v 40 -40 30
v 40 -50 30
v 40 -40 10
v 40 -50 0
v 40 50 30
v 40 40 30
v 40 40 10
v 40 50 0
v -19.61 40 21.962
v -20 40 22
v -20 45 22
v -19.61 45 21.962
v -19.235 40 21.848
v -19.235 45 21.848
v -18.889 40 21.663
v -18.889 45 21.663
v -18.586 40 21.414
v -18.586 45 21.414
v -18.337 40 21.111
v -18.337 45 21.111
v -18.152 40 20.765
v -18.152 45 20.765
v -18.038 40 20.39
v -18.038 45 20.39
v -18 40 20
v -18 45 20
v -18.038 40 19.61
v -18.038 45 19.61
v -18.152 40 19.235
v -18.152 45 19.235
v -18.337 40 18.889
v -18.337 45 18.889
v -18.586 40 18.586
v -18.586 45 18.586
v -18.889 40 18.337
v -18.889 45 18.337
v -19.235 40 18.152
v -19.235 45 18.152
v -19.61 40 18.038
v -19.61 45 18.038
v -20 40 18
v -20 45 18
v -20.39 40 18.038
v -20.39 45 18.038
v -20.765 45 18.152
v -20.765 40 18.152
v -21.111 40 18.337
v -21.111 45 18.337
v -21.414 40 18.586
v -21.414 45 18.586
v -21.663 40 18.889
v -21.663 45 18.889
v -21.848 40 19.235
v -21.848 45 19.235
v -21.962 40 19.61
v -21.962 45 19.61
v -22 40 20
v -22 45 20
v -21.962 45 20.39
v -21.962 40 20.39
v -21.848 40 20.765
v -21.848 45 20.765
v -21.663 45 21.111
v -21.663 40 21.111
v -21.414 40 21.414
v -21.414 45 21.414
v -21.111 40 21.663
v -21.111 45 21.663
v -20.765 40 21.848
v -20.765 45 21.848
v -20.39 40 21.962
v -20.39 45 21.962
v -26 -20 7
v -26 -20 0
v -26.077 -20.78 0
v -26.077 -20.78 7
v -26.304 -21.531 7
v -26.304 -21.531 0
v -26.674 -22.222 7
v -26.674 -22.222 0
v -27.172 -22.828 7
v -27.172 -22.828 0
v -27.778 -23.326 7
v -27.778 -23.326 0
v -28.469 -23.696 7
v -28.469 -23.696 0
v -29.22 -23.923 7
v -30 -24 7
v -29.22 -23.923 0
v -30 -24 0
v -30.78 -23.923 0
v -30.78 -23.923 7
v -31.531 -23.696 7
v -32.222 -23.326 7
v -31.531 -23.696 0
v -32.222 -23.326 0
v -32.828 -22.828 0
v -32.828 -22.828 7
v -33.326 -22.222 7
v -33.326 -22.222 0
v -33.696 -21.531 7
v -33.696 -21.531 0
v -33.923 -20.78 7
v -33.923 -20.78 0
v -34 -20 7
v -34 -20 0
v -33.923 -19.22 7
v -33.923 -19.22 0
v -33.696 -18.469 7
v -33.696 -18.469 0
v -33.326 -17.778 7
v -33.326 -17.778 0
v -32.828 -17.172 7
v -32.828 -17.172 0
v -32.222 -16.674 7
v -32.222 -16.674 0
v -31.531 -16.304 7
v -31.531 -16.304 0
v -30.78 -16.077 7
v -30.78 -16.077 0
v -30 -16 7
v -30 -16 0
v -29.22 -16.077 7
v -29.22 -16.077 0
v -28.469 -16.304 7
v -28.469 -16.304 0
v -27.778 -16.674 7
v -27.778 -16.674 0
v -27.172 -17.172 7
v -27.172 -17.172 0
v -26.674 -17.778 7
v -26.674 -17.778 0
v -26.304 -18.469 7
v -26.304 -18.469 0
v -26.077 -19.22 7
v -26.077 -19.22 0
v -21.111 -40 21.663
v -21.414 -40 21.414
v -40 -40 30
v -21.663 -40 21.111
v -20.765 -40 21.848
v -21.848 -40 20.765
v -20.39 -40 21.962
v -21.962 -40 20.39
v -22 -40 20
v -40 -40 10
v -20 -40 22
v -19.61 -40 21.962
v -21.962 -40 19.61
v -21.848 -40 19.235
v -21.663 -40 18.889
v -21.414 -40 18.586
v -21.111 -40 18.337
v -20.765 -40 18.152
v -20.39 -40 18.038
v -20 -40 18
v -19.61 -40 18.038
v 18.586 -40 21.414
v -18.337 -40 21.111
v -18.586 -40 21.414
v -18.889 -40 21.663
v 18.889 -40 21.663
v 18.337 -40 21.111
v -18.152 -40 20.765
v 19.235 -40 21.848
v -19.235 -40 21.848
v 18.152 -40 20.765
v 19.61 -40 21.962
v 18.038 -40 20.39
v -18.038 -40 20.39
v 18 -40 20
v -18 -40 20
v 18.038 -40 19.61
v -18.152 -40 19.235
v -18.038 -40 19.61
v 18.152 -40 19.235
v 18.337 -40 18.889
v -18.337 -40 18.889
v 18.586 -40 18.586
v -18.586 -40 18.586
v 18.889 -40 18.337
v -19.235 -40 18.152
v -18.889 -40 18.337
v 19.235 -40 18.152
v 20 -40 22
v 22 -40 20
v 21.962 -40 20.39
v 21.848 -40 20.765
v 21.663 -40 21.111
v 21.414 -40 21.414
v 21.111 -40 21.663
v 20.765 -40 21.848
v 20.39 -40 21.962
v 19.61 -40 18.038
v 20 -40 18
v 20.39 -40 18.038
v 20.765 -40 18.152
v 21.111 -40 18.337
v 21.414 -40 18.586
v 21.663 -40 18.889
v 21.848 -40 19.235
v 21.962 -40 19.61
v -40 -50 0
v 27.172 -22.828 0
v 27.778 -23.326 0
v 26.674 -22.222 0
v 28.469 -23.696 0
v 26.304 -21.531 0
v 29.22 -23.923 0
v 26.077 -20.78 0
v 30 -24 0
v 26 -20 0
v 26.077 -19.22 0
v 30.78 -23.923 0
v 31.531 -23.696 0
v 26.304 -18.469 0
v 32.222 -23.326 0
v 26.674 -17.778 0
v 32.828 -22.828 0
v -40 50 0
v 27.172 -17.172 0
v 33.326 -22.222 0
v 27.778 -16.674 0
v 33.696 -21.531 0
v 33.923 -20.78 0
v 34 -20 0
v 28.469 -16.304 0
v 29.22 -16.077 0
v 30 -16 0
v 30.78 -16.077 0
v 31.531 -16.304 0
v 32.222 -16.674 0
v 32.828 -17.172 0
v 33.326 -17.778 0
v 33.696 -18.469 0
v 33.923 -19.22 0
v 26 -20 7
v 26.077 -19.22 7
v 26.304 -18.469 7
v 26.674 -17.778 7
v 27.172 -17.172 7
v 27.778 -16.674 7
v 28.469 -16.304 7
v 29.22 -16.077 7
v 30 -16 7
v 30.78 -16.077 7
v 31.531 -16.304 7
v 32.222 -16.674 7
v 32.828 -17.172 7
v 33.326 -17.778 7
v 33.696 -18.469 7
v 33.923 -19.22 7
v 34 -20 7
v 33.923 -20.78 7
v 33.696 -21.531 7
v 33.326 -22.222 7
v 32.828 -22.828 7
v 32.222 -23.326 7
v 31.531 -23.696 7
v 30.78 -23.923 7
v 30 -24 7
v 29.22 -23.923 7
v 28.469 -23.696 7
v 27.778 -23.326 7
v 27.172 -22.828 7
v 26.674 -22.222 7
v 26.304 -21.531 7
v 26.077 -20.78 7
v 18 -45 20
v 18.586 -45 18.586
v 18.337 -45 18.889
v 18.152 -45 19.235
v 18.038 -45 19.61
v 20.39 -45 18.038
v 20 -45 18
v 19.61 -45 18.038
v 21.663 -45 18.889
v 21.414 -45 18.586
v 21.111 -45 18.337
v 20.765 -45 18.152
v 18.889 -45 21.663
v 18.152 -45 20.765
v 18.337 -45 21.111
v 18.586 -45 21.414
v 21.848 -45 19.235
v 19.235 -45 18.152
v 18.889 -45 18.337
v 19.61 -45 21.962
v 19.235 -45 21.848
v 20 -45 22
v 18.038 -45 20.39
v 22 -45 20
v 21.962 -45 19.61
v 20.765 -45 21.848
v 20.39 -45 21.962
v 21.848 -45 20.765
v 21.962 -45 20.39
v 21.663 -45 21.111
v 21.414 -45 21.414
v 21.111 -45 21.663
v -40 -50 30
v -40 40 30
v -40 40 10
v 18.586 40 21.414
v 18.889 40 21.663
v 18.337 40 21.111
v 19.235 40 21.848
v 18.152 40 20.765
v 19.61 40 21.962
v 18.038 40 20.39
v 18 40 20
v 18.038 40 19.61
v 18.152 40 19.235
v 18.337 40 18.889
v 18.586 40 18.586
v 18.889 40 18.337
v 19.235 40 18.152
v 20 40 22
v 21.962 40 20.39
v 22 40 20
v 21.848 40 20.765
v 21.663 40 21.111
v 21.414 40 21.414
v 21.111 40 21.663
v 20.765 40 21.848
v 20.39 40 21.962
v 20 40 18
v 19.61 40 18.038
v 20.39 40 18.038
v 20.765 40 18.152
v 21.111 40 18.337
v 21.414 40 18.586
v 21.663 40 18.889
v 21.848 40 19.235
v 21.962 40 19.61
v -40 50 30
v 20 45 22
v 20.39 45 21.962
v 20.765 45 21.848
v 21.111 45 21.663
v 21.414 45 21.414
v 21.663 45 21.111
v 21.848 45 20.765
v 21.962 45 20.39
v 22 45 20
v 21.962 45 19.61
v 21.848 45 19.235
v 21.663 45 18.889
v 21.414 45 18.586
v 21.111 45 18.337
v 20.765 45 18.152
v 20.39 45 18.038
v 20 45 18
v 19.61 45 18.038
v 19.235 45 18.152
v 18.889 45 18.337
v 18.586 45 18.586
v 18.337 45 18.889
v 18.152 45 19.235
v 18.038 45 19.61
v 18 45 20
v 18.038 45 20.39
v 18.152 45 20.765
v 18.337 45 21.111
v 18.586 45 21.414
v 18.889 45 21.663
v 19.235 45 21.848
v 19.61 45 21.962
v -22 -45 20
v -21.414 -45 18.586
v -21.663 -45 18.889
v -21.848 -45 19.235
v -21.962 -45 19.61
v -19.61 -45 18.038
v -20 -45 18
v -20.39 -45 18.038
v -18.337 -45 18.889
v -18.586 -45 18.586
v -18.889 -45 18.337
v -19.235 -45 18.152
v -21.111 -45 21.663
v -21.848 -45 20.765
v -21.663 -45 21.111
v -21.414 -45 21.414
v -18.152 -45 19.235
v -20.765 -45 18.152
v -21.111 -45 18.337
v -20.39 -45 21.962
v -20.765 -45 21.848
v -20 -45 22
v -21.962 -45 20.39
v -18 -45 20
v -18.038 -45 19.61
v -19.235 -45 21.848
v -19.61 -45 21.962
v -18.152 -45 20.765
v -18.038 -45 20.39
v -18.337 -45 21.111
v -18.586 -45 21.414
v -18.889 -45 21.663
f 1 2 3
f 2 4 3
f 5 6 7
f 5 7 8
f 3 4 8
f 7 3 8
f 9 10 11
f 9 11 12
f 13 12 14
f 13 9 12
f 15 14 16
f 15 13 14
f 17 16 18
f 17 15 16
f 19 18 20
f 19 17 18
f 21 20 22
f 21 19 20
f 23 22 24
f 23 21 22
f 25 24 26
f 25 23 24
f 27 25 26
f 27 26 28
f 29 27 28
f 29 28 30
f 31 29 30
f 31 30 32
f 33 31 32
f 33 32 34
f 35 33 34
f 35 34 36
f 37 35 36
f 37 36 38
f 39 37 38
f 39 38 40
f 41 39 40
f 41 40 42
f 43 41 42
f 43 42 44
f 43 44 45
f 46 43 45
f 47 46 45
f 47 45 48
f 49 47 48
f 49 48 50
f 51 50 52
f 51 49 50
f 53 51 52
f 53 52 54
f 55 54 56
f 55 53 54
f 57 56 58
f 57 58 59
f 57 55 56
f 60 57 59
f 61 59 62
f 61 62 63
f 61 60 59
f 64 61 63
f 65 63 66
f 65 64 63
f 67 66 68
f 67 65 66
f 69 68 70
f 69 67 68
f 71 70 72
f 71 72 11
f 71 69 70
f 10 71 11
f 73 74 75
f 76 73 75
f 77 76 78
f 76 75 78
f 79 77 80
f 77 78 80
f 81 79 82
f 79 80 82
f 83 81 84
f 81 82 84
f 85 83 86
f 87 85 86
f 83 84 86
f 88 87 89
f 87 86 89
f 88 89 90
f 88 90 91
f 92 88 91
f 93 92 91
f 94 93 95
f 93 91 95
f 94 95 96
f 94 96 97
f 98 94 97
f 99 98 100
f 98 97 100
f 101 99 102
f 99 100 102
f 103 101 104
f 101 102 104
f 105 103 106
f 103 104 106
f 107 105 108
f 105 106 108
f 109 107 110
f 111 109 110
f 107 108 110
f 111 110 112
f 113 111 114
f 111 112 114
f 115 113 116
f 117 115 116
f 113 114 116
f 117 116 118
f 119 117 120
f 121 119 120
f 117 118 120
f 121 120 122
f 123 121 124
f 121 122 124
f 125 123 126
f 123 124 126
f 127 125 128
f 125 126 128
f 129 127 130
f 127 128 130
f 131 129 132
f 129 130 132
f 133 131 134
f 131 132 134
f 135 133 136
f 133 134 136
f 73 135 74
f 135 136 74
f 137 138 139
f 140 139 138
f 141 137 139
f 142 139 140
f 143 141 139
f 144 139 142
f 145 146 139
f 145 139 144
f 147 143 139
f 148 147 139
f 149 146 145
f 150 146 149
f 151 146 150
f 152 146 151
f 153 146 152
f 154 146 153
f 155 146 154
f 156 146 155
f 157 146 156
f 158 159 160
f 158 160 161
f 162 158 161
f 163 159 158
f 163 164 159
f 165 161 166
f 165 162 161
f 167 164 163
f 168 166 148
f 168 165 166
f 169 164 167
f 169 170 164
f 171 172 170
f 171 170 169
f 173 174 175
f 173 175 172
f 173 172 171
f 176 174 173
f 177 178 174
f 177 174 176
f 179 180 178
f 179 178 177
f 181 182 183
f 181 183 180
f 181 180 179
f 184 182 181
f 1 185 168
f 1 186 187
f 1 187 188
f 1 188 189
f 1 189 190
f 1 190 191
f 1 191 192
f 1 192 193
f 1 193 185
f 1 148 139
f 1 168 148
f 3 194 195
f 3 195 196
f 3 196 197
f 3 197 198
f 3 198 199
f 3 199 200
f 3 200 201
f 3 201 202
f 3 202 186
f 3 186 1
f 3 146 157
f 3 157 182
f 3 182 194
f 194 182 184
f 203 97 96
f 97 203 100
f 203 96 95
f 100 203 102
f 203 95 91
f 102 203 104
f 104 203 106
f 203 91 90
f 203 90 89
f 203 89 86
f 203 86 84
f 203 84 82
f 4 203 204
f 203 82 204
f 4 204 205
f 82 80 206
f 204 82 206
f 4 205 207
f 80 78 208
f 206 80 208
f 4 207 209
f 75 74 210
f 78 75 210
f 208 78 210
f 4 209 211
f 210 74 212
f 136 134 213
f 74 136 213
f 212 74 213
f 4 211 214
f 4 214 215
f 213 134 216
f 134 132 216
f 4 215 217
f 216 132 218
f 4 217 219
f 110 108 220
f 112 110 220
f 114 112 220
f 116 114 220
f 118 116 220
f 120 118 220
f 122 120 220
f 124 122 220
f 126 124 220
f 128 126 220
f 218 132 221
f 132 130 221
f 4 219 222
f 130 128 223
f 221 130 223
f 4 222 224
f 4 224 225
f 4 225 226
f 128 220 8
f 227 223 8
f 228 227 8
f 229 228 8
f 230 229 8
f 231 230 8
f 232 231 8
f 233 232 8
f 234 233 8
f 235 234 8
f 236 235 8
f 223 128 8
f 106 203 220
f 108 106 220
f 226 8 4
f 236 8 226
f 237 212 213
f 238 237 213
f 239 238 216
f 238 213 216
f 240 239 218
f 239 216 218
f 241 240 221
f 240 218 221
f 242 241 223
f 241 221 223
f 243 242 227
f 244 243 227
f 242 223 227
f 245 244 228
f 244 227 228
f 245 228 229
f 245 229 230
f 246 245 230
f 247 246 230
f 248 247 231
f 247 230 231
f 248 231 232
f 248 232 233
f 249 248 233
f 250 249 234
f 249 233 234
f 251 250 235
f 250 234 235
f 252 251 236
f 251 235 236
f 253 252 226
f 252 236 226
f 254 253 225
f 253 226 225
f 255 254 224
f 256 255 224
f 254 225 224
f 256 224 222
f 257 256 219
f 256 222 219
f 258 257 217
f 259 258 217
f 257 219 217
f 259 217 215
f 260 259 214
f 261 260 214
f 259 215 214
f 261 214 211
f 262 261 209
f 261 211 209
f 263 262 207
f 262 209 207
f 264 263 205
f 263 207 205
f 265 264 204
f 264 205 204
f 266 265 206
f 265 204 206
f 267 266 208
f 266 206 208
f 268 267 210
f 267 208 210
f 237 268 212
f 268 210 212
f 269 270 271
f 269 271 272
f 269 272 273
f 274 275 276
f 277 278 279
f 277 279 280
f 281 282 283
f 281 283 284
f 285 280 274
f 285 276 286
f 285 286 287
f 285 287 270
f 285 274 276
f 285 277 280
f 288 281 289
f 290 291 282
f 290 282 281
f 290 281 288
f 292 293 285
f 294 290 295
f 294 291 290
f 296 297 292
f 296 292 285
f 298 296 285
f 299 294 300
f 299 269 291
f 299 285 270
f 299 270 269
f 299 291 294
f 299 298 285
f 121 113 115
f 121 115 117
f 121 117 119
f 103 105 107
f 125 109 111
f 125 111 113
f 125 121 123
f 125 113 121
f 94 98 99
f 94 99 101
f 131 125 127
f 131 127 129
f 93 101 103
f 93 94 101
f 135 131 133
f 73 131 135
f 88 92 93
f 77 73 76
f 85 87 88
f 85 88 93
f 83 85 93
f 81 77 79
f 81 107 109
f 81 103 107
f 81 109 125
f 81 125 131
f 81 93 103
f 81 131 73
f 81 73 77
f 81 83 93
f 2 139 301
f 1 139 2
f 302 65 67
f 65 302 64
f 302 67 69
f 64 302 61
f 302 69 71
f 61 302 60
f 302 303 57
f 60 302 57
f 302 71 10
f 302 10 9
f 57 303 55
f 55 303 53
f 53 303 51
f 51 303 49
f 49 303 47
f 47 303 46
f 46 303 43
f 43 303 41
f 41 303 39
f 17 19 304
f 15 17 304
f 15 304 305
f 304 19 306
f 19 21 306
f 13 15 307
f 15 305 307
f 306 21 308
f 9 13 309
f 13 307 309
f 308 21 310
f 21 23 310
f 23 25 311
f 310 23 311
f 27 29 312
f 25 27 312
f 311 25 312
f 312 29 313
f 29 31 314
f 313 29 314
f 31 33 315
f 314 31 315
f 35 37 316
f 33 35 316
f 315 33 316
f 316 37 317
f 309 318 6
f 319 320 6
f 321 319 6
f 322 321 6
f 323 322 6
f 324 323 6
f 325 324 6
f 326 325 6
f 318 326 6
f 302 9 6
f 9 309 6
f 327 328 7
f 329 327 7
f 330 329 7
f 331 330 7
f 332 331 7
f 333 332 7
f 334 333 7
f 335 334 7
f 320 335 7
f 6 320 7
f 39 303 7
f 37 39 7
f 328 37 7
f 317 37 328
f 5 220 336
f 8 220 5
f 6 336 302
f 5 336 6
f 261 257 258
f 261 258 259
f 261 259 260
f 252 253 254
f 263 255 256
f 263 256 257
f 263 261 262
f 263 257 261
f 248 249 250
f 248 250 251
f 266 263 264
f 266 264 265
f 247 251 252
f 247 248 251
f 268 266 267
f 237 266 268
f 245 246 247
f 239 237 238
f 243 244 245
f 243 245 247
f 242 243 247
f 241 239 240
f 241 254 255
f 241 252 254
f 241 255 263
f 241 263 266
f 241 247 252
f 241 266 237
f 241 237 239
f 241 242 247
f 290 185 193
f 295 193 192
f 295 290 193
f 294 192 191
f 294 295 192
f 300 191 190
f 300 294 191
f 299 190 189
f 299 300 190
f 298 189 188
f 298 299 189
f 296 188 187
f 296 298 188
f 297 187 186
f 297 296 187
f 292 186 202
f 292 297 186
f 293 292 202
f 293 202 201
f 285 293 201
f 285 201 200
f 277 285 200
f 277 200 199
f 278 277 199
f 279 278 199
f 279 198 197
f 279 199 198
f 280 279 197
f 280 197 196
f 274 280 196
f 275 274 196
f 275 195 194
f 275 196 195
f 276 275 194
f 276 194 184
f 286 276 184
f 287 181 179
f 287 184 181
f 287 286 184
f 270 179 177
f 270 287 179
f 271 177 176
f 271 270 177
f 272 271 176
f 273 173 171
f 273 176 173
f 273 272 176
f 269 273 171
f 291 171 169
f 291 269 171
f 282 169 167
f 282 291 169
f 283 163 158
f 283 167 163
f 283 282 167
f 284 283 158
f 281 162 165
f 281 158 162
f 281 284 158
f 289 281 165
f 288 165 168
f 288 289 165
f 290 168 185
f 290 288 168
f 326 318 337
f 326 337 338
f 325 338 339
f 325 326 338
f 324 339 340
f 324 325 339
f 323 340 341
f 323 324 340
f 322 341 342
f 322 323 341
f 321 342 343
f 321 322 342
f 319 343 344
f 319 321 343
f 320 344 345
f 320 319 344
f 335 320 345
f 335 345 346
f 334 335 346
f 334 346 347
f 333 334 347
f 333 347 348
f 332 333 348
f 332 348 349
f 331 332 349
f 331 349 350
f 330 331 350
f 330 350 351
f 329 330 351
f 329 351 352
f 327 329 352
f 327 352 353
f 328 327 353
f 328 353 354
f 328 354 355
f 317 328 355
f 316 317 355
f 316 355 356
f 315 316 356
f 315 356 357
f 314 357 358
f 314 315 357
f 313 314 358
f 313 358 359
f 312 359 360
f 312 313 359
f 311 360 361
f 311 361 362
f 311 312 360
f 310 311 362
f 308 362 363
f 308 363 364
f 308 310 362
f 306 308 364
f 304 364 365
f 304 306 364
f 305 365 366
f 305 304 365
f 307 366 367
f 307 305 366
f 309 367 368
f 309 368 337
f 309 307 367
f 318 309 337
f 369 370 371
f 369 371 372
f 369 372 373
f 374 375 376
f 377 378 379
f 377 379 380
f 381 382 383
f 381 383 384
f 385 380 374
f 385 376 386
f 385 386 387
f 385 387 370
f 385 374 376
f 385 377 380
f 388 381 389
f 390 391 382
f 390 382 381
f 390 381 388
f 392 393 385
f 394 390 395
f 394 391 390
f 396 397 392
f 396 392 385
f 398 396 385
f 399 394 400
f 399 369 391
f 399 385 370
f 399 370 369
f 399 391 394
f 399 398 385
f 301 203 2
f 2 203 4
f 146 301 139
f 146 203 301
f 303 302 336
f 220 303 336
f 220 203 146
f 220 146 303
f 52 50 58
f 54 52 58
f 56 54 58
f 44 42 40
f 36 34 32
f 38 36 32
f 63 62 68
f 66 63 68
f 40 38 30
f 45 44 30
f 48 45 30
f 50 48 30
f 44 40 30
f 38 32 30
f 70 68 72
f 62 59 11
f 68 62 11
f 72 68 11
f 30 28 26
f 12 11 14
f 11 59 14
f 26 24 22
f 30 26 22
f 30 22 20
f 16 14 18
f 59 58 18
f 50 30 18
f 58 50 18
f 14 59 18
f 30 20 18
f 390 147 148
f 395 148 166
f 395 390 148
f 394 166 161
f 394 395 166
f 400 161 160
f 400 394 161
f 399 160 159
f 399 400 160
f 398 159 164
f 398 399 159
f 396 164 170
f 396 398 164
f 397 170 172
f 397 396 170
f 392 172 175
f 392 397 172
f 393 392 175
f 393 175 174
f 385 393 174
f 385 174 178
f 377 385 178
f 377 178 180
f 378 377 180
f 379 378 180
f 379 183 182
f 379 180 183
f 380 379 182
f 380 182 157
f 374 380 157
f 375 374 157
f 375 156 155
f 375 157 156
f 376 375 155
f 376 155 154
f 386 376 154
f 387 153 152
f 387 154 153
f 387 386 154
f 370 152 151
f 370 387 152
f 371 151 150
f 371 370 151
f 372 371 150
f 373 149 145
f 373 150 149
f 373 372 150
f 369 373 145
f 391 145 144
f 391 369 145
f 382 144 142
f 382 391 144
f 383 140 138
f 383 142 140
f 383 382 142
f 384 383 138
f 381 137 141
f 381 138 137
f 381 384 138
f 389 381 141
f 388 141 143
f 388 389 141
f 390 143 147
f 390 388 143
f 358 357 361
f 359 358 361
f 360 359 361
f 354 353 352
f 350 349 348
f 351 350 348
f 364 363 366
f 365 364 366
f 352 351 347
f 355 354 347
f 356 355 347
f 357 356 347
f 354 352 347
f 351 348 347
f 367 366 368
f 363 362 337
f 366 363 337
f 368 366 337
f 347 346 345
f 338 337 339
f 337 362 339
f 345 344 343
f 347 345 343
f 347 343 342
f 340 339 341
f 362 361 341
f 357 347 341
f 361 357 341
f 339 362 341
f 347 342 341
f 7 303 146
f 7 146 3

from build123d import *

# Parameters (mm, degrees)
SKETCH1_W               = 80
SKETCH1_H               = 100
BOSS_EXTRUDE1_DEPTH     = 10
SKETCH2_R               = 4
CUT_EXTRUDE1_DEPTH      = 7
SKETCH3_W               = 80
SKETCH3_H               = 10
BOSS_EXTRUDE2_DEPTH     = 20
CUT_EXTRUDE2_DEPTH      = 85
CUT_EXTRUDE2_DEPTH_BACK = 5
SKETCH4_R               = 2


with BuildPart() as part:
    # Sketch1 → Boss-Extrude1 (new body)
    with BuildSketch(Plane.XY):
        Rectangle(SKETCH1_W, SKETCH1_H)
    extrude(amount=BOSS_EXTRUDE1_DEPTH)

    # Sketch2 → Cut-Extrude1 (cut)
    with BuildSketch(Plane(origin=(0, 0, 0), x_dir=(-1, 0, 0), z_dir=(0, 0, -1))):
        with Locations((-30, -20)):
            Circle(SKETCH2_R)
        with Locations(Location((30, -20, 0), (0, 0, 180))):
            Circle(SKETCH2_R)
    extrude(amount=-CUT_EXTRUDE1_DEPTH, mode=Mode.SUBTRACT)

    # Sketch3 → Boss-Extrude2 (add)
    with BuildSketch(Plane.XY.offset(10)):
        with Locations((0, -45)):
            Rectangle(SKETCH3_W, SKETCH3_H)
        with Locations((0, 45)):
            Rectangle(SKETCH3_W, SKETCH3_H)
    extrude(amount=BOSS_EXTRUDE2_DEPTH)

    # Sketch4 → Cut-Extrude2 (cut, two sides: drawn at the far end of the back side and taken through both)
    with BuildSketch(Plane(origin=(0, -40, 0), x_dir=(1, 0, 0), z_dir=(0, 1, 0)).offset(-CUT_EXTRUDE2_DEPTH_BACK)):
        with Locations(Location((-20, -20, 0), (0, 0, 270))):
            Circle(SKETCH4_R)
        with Locations(Location((20, -20, 0), (0, 0, 270))):
            Circle(SKETCH4_R)
    extrude(amount=CUT_EXTRUDE2_DEPTH + CUT_EXTRUDE2_DEPTH_BACK, mode=Mode.SUBTRACT)


solid = part.part
